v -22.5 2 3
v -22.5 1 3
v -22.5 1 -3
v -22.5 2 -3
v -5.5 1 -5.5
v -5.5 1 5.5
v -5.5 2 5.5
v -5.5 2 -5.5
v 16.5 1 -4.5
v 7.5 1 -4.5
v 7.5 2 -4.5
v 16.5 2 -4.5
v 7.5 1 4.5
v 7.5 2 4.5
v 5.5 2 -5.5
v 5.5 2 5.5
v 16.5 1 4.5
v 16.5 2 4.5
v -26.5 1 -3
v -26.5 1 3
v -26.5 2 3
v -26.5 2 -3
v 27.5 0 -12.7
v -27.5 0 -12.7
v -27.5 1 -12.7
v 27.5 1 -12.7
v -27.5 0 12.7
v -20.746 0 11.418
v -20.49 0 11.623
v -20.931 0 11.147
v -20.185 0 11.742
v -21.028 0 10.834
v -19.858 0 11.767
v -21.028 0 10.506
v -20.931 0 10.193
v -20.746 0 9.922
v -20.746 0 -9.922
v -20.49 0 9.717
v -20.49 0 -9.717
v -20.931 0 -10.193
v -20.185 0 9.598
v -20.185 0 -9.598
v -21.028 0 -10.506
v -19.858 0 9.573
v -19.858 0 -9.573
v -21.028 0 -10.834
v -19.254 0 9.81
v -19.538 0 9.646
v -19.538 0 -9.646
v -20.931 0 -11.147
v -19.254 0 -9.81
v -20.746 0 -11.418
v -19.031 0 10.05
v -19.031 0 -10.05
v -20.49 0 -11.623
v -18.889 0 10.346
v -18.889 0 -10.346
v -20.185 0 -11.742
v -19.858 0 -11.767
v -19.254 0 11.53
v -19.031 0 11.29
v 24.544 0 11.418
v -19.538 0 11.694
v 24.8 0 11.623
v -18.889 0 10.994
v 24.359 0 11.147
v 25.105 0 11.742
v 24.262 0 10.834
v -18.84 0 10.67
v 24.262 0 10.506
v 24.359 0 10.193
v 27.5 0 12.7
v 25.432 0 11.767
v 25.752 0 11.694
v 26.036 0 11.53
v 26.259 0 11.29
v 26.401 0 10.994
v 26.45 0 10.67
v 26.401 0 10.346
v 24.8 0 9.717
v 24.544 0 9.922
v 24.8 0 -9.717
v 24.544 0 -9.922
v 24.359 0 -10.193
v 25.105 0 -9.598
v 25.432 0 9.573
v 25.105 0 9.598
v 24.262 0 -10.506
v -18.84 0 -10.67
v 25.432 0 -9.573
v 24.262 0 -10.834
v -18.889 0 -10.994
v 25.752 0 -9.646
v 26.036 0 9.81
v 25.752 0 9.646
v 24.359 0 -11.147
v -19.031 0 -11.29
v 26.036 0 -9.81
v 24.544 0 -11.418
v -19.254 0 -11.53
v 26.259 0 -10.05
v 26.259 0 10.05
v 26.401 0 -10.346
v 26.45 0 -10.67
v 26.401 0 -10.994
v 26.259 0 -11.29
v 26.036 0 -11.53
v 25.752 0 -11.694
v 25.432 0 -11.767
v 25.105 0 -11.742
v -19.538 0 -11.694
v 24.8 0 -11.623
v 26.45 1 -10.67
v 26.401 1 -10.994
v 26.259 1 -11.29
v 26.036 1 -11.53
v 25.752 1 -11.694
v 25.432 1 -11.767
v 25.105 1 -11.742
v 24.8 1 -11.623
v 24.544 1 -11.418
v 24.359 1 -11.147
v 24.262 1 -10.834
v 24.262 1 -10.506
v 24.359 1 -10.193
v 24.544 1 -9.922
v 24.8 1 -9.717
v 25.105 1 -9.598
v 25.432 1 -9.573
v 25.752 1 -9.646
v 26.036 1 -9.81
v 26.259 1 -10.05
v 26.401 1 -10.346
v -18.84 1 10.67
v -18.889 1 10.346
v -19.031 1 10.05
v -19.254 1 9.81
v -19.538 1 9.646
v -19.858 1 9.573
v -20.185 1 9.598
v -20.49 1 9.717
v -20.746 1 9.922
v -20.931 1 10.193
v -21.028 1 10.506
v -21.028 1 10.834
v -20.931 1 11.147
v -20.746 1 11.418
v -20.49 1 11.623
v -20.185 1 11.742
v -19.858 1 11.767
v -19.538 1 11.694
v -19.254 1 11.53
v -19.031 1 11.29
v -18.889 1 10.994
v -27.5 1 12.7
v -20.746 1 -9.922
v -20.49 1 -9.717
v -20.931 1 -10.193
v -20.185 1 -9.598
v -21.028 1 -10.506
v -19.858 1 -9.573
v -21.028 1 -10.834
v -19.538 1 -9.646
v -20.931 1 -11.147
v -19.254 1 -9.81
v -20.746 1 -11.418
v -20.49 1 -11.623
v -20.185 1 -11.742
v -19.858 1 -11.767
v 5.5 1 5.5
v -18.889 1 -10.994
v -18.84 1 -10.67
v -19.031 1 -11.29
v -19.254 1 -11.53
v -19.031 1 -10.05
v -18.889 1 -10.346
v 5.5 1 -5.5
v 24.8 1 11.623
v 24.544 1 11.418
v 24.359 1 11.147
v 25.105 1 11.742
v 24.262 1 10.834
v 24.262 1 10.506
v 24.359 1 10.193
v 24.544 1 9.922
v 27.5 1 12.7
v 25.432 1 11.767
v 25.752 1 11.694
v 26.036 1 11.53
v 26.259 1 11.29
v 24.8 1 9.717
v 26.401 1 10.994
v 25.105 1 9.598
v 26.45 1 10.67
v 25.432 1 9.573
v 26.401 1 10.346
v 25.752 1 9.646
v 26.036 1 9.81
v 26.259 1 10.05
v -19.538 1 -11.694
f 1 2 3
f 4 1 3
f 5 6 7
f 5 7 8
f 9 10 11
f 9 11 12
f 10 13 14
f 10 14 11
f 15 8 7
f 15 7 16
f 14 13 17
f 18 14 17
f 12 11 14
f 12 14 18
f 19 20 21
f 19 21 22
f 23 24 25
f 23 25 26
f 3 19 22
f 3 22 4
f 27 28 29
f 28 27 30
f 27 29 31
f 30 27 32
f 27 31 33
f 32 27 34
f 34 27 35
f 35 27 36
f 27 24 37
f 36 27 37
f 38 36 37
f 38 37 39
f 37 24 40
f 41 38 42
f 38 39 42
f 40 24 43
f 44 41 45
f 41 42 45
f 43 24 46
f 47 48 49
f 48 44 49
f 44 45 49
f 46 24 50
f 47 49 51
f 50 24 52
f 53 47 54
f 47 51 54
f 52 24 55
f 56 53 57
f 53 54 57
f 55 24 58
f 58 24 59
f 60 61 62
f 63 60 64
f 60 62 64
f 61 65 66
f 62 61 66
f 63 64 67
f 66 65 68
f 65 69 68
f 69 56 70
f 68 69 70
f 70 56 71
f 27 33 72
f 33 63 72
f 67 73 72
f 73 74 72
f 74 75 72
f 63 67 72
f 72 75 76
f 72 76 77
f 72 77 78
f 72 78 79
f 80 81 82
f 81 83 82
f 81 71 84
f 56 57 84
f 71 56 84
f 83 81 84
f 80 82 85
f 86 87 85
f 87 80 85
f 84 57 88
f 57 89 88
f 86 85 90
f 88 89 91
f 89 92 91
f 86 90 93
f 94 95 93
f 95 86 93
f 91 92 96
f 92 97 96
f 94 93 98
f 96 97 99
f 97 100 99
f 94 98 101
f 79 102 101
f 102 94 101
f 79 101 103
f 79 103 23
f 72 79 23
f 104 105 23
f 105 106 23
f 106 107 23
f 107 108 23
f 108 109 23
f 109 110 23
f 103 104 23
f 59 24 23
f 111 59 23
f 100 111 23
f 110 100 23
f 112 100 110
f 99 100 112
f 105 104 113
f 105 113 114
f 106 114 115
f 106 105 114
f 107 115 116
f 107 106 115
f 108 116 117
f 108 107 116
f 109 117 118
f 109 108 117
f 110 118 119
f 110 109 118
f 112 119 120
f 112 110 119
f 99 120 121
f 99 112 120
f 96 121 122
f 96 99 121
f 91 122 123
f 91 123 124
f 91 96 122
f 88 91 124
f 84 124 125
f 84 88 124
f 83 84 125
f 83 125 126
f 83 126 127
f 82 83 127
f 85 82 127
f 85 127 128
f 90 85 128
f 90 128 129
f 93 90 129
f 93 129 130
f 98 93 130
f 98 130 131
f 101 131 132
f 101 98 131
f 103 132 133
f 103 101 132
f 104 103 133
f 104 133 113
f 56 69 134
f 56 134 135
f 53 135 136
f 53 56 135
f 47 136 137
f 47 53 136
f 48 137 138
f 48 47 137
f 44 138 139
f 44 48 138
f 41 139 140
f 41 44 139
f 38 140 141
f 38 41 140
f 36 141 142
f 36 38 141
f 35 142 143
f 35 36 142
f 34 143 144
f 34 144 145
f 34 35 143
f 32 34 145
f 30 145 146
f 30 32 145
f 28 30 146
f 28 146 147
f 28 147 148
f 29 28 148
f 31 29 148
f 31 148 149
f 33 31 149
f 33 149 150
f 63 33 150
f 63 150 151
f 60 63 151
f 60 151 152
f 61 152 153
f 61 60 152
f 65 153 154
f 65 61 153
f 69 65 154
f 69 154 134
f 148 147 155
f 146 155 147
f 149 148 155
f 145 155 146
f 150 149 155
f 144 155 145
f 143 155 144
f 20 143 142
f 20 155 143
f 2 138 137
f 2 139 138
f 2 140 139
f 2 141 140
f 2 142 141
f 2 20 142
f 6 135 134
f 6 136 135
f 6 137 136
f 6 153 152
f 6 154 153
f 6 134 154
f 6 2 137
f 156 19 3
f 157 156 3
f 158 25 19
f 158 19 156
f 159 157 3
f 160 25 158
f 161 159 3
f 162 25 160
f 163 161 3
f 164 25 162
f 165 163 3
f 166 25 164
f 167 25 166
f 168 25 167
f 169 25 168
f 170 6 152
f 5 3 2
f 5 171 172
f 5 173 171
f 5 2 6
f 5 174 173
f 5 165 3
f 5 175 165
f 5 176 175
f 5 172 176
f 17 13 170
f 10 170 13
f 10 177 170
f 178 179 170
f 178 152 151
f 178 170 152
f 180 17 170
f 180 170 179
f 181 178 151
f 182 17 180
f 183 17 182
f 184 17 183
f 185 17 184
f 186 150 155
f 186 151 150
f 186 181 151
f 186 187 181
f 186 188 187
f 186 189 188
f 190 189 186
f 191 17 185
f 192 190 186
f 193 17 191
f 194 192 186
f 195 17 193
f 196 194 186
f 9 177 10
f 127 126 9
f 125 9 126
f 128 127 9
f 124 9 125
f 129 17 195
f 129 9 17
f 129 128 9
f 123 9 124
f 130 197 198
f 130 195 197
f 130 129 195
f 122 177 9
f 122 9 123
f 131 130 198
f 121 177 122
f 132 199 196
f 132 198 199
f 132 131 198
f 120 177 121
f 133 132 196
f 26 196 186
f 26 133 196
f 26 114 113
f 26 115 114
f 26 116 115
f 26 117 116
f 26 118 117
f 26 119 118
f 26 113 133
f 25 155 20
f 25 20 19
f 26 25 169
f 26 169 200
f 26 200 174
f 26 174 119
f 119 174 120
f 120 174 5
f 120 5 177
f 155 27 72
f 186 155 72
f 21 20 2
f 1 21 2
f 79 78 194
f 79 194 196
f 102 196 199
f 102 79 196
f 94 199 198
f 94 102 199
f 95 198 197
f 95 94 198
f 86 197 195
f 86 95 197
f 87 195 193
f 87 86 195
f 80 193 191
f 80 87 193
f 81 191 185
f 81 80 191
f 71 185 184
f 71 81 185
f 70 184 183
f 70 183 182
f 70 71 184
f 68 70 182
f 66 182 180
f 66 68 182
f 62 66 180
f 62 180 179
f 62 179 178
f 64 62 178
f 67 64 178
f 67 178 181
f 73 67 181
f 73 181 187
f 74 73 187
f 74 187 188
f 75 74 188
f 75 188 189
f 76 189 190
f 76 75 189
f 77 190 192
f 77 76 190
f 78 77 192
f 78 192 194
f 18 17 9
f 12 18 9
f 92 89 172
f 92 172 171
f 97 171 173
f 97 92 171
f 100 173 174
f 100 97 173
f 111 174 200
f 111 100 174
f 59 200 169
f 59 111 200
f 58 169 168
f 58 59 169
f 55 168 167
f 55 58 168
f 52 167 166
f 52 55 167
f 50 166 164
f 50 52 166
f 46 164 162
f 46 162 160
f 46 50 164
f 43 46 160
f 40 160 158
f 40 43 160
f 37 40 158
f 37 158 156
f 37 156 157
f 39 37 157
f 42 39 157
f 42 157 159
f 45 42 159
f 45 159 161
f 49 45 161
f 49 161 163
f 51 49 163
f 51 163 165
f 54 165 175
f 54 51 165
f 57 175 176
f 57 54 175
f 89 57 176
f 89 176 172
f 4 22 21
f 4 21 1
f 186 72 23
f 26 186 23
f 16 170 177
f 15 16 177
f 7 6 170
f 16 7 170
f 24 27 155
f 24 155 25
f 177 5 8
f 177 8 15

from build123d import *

# Parameters (mm, degrees)
SKETCH_1_W      = 55
SKETCH_1_H      = 25.4
SKETCH_1_R      = 1.1
SKETCH_1_W_2    = 4
SKETCH_1_H_2    = 6
SKETCH_1_W_3    = 11
SKETCH_1_H_3    = 11
SKETCH_1_W_4    = 9
SKETCH_1_H_4    = 9
EXTRUDE_1_DEPTH = 1
SKETCH_1_3_W    = 11
SKETCH_1_3_H    = 11
SKETCH_1_3_W_2  = 9
SKETCH_1_3_H_2  = 9
SKETCH_1_3_W_3  = 4
SKETCH_1_3_H_3  = 6
EXTRUDE_2_DEPTH = 2


with BuildPart() as part:
    # 草图1 → 凸台-拉伸1 (new body)
    with BuildSketch(Plane(origin=(0, 0, 0), x_dir=(1, 0, 0), z_dir=(0, 1, 0))):
        Rectangle(SKETCH_1_W, SKETCH_1_H)
        with Locations((-19.94, -10.67)):
            Circle(SKETCH_1_R, mode=Mode.SUBTRACT)
        with Locations((-24.5, 0)):
            Rectangle(SKETCH_1_W_2, SKETCH_1_H_2, mode=Mode.SUBTRACT)
        with Locations((25.35, -10.67)):
            Circle(SKETCH_1_R, mode=Mode.SUBTRACT)
        Rectangle(SKETCH_1_W_3, SKETCH_1_H_3, mode=Mode.SUBTRACT)
        with Locations((12, 0)):
            Rectangle(SKETCH_1_W_4, SKETCH_1_H_4, mode=Mode.SUBTRACT)
        with Locations((-19.94, 10.67)):
            Circle(SKETCH_1_R, mode=Mode.SUBTRACT)
        with Locations((25.35, 10.67)):
            Circle(SKETCH_1_R, mode=Mode.SUBTRACT)
    extrude(amount=EXTRUDE_1_DEPTH)

    # 草图1<3> → 凸台-拉伸2 (add)
    with BuildSketch(Plane(origin=(0, 0, 0), x_dir=(1, 0, 0), z_dir=(0, 1, 0))):
        Rectangle(SKETCH_1_3_W, SKETCH_1_3_H)
        with Locations((12, 0)):
            Rectangle(SKETCH_1_3_W_2, SKETCH_1_3_H_2)
        with Locations((-24.5, 0)):
            Rectangle(SKETCH_1_3_W_3, SKETCH_1_3_H_3)
    extrude(amount=EXTRUDE_2_DEPTH)


solid = part.part
